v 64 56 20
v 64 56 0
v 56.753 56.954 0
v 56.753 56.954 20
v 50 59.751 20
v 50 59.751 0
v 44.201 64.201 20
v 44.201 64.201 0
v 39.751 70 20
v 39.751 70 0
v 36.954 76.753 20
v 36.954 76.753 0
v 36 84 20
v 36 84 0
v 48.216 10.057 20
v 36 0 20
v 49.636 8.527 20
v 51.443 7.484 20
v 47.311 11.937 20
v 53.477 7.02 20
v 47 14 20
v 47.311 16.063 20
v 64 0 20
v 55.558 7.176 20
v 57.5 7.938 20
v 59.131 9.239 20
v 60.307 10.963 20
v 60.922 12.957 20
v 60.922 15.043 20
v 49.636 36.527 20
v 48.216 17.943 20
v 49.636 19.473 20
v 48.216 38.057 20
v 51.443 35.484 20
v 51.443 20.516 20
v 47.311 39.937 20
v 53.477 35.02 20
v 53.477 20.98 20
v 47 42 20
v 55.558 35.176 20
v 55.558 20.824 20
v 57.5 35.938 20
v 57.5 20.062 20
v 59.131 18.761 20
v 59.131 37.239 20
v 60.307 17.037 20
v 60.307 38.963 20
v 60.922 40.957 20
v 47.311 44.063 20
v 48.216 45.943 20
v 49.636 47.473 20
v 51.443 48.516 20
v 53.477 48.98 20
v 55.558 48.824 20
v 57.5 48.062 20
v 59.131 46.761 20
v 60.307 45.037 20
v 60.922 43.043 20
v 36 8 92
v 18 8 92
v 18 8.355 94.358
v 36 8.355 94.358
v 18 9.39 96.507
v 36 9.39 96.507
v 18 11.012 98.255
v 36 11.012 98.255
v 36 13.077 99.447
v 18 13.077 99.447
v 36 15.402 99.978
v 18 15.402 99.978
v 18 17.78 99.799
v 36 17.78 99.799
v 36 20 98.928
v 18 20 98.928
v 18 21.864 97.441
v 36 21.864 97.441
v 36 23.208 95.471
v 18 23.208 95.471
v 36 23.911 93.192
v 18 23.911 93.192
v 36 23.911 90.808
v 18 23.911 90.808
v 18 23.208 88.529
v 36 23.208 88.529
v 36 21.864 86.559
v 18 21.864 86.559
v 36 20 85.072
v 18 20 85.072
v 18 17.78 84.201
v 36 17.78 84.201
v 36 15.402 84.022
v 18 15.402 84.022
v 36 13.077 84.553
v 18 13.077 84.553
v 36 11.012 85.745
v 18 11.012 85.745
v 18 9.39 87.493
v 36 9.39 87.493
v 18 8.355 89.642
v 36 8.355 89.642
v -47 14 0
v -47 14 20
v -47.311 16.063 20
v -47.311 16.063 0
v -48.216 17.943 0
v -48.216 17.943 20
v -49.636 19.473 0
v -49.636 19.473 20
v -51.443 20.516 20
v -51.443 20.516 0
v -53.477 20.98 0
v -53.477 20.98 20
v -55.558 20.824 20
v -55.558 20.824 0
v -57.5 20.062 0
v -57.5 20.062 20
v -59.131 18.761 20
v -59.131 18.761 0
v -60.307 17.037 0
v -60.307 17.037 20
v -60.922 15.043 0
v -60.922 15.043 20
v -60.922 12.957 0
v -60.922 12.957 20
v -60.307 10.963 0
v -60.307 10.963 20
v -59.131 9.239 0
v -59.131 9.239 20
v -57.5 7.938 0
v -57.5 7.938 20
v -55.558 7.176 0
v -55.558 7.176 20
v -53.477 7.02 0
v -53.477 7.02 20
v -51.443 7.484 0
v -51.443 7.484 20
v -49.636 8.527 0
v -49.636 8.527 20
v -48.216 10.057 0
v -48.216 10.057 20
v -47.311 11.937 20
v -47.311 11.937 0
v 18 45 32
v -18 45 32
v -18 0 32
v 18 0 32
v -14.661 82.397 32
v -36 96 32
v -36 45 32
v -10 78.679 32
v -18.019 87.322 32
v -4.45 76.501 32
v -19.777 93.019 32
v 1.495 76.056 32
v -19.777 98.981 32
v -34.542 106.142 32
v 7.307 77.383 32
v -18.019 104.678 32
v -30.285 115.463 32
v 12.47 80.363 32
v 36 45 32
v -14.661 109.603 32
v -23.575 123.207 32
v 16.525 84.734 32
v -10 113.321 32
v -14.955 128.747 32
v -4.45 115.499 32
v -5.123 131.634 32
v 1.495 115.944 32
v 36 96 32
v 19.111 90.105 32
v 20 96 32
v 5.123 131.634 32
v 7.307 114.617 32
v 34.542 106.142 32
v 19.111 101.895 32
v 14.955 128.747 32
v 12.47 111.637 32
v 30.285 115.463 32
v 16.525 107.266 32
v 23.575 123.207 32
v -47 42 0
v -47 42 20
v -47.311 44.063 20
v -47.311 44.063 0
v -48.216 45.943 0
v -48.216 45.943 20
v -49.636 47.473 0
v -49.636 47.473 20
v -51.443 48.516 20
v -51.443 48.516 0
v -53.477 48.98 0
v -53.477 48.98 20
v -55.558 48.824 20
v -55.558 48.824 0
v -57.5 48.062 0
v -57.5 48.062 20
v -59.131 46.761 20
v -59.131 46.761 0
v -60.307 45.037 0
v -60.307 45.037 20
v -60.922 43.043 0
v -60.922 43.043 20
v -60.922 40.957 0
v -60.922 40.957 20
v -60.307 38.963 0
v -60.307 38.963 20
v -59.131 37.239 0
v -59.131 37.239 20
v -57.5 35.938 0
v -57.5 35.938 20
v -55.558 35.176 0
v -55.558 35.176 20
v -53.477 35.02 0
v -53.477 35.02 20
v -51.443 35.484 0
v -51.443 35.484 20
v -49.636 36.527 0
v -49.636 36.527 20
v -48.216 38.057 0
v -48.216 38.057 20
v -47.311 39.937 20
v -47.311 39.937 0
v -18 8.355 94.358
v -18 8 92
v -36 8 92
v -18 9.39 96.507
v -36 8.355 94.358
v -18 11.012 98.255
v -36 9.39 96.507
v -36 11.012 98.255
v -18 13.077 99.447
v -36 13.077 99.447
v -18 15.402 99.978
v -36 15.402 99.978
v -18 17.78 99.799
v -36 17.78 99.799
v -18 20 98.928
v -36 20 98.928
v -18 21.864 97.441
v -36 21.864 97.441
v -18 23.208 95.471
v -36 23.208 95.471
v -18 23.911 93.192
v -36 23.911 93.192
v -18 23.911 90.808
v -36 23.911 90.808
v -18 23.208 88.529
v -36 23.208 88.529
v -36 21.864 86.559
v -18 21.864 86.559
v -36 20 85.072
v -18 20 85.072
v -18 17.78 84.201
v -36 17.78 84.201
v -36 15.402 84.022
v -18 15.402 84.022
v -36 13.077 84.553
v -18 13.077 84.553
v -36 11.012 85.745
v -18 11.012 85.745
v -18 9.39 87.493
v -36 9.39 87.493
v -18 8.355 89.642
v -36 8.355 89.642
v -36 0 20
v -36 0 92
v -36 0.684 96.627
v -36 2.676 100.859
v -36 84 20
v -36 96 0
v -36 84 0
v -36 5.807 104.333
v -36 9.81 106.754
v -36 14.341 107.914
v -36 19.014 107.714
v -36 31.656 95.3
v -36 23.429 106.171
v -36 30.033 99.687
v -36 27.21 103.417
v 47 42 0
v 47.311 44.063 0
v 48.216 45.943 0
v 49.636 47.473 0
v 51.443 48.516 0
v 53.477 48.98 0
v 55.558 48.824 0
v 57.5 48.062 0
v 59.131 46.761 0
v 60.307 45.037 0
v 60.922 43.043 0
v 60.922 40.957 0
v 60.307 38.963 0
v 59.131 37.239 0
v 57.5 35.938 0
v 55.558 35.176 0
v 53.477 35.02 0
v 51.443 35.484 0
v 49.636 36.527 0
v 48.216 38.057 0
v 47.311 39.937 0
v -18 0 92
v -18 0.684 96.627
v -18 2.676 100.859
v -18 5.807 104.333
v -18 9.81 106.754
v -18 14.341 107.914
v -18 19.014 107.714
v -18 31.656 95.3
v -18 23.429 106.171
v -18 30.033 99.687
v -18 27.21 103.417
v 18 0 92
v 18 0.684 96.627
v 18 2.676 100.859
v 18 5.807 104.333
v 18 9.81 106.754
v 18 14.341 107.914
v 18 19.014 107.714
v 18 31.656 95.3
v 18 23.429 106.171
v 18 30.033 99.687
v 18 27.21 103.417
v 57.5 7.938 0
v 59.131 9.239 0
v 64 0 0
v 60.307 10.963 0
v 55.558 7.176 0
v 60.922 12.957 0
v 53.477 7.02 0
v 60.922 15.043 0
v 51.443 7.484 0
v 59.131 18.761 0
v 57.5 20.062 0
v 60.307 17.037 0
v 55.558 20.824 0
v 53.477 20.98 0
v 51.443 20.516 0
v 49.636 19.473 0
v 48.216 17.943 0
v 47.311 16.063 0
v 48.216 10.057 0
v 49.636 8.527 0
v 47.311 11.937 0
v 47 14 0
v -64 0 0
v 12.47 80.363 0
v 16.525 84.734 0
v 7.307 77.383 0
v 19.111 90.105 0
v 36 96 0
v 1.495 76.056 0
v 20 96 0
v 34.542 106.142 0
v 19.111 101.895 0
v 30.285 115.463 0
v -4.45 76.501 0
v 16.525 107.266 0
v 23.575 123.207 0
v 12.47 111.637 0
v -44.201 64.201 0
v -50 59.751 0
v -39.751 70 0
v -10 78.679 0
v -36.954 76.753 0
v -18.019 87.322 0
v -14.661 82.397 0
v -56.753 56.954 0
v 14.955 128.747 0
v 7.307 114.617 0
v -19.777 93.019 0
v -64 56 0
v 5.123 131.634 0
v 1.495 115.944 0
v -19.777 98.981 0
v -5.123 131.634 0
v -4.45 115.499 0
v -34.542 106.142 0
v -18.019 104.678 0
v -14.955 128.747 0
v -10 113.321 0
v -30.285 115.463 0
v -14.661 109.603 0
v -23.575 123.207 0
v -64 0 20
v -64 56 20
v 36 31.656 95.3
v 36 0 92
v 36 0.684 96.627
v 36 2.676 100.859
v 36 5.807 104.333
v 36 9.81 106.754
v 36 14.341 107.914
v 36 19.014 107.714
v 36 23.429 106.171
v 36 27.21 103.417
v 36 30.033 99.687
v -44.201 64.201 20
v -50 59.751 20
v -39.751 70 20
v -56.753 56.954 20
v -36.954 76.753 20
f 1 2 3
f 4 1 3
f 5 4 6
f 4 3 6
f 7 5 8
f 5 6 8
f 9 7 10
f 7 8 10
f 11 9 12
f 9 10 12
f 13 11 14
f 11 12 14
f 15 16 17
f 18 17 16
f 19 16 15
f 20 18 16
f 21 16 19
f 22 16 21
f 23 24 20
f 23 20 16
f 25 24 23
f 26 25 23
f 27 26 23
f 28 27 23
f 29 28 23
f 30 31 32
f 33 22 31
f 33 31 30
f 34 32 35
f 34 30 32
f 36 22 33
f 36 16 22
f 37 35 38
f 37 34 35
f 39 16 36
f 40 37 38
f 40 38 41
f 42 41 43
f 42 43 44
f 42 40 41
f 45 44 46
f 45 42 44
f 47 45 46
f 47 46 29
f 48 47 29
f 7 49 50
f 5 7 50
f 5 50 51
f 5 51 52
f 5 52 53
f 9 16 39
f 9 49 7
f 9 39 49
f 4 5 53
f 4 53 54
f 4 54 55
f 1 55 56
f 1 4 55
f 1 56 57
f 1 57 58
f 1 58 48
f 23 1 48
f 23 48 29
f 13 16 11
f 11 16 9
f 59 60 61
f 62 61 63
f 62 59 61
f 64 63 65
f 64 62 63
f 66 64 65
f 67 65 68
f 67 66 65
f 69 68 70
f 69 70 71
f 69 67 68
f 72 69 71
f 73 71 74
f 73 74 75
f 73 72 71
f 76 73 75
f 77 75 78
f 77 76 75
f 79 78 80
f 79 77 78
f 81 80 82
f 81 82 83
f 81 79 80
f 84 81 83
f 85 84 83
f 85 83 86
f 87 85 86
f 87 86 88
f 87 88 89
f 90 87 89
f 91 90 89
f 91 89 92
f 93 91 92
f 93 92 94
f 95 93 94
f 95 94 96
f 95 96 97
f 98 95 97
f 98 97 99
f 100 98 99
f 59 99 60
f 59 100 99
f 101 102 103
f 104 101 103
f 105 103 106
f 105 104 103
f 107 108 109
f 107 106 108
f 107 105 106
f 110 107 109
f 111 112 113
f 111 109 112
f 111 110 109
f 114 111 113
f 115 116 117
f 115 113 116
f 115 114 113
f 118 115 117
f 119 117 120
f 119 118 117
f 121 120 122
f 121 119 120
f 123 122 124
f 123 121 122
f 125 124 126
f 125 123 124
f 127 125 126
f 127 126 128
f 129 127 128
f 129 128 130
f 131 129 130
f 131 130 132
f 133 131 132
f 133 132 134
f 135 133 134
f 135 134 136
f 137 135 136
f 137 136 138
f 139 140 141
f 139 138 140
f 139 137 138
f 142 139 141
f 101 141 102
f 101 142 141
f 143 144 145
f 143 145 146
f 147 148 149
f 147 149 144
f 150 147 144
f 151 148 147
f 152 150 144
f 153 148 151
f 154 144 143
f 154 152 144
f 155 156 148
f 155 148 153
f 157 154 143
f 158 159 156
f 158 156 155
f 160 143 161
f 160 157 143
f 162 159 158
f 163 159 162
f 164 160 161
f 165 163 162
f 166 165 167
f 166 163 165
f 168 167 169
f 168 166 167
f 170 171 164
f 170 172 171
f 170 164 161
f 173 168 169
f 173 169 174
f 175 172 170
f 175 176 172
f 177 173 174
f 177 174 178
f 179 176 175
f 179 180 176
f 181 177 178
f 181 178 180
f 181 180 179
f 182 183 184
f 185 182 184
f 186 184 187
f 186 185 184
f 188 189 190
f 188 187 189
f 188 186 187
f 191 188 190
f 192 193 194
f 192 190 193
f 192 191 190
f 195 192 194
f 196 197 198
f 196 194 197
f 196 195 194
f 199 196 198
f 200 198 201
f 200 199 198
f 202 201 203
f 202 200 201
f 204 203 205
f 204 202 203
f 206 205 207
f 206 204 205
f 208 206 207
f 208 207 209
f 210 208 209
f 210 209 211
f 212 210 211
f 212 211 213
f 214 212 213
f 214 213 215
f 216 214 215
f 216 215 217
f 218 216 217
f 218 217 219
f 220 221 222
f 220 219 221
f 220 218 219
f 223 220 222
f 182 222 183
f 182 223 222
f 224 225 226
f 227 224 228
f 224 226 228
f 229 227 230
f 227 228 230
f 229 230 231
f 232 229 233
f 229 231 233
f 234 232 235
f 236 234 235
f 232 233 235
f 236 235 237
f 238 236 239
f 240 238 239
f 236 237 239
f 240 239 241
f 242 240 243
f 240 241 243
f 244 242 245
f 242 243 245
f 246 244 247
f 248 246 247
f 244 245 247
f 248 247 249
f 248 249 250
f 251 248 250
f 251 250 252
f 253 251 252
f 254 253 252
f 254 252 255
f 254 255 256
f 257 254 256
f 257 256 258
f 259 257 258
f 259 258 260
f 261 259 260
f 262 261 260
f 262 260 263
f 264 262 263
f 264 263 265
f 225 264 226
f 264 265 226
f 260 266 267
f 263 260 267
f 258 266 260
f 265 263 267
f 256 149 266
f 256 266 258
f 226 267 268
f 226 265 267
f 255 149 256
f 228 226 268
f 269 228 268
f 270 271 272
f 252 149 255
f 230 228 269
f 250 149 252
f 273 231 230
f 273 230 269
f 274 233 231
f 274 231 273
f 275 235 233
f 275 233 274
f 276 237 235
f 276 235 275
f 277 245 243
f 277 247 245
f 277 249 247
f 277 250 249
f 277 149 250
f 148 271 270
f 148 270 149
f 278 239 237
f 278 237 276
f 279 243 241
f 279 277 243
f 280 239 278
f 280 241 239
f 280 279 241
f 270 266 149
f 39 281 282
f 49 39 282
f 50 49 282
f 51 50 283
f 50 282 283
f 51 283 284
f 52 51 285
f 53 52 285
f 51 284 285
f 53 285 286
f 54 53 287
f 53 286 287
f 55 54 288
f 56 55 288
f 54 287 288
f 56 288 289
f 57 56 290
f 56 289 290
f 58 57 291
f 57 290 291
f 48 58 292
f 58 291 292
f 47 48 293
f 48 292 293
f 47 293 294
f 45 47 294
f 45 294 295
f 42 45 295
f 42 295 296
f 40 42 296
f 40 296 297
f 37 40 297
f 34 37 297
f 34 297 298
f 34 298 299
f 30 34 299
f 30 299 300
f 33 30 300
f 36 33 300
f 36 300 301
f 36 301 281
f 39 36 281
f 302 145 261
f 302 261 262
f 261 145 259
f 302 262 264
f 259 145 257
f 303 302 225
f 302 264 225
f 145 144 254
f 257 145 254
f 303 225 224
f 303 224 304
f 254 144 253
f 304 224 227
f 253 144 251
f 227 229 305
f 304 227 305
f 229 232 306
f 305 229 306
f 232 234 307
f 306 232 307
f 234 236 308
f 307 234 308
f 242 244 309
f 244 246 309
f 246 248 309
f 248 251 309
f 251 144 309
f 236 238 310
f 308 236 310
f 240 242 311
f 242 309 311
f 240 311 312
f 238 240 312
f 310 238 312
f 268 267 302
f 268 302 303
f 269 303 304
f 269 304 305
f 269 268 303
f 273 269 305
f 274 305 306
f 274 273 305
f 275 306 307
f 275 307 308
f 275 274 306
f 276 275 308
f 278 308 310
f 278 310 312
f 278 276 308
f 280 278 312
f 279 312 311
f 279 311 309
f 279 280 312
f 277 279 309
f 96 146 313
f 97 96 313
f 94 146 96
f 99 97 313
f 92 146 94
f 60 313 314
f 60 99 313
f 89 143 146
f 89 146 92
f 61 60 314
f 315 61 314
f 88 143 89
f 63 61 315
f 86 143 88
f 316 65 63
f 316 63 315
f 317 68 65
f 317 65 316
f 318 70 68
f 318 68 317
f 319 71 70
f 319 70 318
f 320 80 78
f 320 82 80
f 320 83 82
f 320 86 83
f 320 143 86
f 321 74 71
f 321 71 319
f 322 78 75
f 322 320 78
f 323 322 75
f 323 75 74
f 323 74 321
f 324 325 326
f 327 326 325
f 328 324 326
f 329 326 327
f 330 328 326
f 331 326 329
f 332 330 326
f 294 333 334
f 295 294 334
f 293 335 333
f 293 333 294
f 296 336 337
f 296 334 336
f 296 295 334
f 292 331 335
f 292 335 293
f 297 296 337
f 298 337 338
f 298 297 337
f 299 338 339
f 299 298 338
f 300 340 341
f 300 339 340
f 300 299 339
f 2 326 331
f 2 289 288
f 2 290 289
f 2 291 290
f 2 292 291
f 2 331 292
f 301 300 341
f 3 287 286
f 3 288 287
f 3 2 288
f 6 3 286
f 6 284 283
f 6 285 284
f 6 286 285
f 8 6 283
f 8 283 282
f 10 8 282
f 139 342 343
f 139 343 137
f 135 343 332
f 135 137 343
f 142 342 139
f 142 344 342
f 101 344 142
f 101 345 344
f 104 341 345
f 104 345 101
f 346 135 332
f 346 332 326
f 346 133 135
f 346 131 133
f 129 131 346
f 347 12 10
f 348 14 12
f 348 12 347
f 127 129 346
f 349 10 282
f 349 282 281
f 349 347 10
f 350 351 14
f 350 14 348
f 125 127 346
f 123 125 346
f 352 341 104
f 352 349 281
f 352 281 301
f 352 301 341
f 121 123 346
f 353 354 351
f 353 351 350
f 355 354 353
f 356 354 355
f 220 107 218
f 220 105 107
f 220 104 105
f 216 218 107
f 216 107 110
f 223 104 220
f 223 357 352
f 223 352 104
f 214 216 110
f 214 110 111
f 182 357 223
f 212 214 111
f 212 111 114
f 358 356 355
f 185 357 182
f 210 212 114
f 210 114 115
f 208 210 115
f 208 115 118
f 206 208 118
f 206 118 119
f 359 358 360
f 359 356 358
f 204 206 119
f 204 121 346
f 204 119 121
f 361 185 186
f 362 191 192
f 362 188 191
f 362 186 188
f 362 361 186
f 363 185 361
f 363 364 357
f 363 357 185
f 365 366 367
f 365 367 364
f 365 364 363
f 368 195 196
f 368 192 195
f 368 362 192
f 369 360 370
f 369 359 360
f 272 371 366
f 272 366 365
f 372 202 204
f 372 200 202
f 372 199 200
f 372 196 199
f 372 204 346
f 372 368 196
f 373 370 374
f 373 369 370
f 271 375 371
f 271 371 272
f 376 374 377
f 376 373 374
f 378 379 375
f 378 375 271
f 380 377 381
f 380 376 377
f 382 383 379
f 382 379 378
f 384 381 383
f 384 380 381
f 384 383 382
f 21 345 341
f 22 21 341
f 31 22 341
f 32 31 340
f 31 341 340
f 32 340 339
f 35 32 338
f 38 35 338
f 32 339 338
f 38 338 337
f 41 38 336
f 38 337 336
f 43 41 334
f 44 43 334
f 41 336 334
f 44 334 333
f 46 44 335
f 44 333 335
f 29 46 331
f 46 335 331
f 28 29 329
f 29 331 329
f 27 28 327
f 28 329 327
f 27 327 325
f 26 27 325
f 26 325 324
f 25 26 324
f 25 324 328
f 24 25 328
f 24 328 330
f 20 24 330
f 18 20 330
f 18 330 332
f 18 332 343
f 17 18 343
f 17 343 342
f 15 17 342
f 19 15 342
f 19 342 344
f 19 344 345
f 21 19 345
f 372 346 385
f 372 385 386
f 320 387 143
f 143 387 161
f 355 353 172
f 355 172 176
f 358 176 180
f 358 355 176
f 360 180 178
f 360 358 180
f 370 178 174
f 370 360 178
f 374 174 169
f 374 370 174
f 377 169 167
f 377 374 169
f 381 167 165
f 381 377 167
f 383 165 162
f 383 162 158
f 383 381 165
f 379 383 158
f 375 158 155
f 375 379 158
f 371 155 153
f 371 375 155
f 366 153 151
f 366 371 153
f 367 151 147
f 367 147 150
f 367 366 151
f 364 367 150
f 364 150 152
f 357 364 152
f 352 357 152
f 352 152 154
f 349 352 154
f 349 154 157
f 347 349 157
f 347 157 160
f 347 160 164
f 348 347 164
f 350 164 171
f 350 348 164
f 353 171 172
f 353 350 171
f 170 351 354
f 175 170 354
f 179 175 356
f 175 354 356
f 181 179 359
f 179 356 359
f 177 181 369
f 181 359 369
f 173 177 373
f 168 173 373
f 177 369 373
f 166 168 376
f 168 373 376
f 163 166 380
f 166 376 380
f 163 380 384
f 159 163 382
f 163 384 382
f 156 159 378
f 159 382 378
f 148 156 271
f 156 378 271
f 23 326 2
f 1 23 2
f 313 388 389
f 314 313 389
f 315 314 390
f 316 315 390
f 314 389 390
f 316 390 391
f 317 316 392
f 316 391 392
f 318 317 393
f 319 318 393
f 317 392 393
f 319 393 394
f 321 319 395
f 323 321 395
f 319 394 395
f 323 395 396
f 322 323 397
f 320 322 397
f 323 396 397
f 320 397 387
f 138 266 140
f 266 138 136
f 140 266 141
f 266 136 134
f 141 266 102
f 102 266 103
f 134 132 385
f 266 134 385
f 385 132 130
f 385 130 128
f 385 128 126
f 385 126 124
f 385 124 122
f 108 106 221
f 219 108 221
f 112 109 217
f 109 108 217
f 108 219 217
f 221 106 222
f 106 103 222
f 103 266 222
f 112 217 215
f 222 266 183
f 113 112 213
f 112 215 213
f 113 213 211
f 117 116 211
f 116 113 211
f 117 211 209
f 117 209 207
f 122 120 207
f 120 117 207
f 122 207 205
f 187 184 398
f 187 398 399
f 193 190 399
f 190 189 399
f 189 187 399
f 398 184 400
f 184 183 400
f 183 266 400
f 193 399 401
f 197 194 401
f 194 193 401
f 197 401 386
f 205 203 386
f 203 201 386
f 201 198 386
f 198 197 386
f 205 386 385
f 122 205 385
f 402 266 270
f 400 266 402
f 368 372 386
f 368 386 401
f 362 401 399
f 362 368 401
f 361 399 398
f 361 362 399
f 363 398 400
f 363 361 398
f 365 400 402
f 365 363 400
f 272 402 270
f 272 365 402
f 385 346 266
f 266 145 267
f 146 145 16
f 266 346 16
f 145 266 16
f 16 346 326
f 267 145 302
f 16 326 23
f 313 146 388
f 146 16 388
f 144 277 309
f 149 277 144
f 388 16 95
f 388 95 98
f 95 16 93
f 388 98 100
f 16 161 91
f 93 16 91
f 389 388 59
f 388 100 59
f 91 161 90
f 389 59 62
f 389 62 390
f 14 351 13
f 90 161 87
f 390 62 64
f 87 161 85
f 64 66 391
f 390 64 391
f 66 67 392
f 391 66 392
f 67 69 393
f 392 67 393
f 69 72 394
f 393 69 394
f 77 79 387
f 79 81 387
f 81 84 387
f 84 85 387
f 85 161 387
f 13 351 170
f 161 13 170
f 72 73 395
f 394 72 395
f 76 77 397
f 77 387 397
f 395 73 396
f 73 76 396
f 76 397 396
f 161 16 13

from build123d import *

# Parameters (mm, degrees)
SKETCH1_R           = 20
BOSS_EXTRUDE1_DEPTH = 32
BOSS_EXTRUDE2_DEPTH = 20
SKETCH4_R           = 8
BOSS_EXTRUDE3_DEPTH = 18
HOLE1_D             = 14
HOLE1_DEPTH         = 100


with BuildPart() as part:
    # Sketch1 → Boss-Extrude1 (new body)
    with BuildSketch(Plane.XY):
        with BuildLine():
            Line((-36, 96), (-36, 0))
            Line((-36, 0), (36, 0))
            Line((36, 0), (36, 96))
            ThreePointArc((36, 96), (0, 132), (-36, 96))
        make_face()
        with Locations((0, 96)):
            Circle(SKETCH1_R, mode=Mode.SUBTRACT)
    extrude(amount=BOSS_EXTRUDE1_DEPTH)

    # Sketch2 → Boss-Extrude2 (add)
    with BuildSketch(Plane.XY):
        with BuildLine():
            Line((36, 0), (64, 0))
            Line((64, 0), (64, 56))
            ThreePointArc((64, 56), (44.201010127, 64.201010127), (36, 84))
            Line((36, 84), (36, 0))
        make_face()
    boss_extrude2 = extrude(amount=BOSS_EXTRUDE2_DEPTH)

    # Mirror1: Boss-Extrude2 across plane
    add(boss_extrude2.mirror(Plane(origin=(0, 0, 0), x_dir=(0, 0, 1), z_dir=(1, 0, 0))))

    # Sketch4 → Boss-Extrude3 (add)
    with BuildSketch(Plane.ZY.offset(36)):
        with BuildLine():
            Line((32, 0), (92, 0))
            ThreePointArc((92, 0), (107.913745942, 14.340876714), (95.300358308, 31.65591374))
            Line((95.300358308, 31.65591374), (32, 45))
            Line((32, 45), (32, 0))
        make_face()
        with Locations(Location((92, 16, 0), (0, 0, 270))):
            Circle(SKETCH4_R, mode=Mode.SUBTRACT)
    boss_extrude3 = extrude(amount=-BOSS_EXTRUDE3_DEPTH)

    # Mirror2: Boss-Extrude3 across plane
    add(boss_extrude3.mirror(Plane(origin=(0, 0, 0), x_dir=(0, 0, 1), z_dir=(1, 0, 0))))

    # Hole1
    with Locations(Plane.XY.offset(20)):
        with Locations((54, 14), (54, 42)):
            hole1 = Hole(HOLE1_D / 2, depth=HOLE1_DEPTH)

    # Mirror3: Hole1 across plane
    add(hole1.mirror(Plane(origin=(0, 0, 0), x_dir=(0, 0, 1), z_dir=(1, 0, 0))), mode=Mode.SUBTRACT)


solid = part.part
